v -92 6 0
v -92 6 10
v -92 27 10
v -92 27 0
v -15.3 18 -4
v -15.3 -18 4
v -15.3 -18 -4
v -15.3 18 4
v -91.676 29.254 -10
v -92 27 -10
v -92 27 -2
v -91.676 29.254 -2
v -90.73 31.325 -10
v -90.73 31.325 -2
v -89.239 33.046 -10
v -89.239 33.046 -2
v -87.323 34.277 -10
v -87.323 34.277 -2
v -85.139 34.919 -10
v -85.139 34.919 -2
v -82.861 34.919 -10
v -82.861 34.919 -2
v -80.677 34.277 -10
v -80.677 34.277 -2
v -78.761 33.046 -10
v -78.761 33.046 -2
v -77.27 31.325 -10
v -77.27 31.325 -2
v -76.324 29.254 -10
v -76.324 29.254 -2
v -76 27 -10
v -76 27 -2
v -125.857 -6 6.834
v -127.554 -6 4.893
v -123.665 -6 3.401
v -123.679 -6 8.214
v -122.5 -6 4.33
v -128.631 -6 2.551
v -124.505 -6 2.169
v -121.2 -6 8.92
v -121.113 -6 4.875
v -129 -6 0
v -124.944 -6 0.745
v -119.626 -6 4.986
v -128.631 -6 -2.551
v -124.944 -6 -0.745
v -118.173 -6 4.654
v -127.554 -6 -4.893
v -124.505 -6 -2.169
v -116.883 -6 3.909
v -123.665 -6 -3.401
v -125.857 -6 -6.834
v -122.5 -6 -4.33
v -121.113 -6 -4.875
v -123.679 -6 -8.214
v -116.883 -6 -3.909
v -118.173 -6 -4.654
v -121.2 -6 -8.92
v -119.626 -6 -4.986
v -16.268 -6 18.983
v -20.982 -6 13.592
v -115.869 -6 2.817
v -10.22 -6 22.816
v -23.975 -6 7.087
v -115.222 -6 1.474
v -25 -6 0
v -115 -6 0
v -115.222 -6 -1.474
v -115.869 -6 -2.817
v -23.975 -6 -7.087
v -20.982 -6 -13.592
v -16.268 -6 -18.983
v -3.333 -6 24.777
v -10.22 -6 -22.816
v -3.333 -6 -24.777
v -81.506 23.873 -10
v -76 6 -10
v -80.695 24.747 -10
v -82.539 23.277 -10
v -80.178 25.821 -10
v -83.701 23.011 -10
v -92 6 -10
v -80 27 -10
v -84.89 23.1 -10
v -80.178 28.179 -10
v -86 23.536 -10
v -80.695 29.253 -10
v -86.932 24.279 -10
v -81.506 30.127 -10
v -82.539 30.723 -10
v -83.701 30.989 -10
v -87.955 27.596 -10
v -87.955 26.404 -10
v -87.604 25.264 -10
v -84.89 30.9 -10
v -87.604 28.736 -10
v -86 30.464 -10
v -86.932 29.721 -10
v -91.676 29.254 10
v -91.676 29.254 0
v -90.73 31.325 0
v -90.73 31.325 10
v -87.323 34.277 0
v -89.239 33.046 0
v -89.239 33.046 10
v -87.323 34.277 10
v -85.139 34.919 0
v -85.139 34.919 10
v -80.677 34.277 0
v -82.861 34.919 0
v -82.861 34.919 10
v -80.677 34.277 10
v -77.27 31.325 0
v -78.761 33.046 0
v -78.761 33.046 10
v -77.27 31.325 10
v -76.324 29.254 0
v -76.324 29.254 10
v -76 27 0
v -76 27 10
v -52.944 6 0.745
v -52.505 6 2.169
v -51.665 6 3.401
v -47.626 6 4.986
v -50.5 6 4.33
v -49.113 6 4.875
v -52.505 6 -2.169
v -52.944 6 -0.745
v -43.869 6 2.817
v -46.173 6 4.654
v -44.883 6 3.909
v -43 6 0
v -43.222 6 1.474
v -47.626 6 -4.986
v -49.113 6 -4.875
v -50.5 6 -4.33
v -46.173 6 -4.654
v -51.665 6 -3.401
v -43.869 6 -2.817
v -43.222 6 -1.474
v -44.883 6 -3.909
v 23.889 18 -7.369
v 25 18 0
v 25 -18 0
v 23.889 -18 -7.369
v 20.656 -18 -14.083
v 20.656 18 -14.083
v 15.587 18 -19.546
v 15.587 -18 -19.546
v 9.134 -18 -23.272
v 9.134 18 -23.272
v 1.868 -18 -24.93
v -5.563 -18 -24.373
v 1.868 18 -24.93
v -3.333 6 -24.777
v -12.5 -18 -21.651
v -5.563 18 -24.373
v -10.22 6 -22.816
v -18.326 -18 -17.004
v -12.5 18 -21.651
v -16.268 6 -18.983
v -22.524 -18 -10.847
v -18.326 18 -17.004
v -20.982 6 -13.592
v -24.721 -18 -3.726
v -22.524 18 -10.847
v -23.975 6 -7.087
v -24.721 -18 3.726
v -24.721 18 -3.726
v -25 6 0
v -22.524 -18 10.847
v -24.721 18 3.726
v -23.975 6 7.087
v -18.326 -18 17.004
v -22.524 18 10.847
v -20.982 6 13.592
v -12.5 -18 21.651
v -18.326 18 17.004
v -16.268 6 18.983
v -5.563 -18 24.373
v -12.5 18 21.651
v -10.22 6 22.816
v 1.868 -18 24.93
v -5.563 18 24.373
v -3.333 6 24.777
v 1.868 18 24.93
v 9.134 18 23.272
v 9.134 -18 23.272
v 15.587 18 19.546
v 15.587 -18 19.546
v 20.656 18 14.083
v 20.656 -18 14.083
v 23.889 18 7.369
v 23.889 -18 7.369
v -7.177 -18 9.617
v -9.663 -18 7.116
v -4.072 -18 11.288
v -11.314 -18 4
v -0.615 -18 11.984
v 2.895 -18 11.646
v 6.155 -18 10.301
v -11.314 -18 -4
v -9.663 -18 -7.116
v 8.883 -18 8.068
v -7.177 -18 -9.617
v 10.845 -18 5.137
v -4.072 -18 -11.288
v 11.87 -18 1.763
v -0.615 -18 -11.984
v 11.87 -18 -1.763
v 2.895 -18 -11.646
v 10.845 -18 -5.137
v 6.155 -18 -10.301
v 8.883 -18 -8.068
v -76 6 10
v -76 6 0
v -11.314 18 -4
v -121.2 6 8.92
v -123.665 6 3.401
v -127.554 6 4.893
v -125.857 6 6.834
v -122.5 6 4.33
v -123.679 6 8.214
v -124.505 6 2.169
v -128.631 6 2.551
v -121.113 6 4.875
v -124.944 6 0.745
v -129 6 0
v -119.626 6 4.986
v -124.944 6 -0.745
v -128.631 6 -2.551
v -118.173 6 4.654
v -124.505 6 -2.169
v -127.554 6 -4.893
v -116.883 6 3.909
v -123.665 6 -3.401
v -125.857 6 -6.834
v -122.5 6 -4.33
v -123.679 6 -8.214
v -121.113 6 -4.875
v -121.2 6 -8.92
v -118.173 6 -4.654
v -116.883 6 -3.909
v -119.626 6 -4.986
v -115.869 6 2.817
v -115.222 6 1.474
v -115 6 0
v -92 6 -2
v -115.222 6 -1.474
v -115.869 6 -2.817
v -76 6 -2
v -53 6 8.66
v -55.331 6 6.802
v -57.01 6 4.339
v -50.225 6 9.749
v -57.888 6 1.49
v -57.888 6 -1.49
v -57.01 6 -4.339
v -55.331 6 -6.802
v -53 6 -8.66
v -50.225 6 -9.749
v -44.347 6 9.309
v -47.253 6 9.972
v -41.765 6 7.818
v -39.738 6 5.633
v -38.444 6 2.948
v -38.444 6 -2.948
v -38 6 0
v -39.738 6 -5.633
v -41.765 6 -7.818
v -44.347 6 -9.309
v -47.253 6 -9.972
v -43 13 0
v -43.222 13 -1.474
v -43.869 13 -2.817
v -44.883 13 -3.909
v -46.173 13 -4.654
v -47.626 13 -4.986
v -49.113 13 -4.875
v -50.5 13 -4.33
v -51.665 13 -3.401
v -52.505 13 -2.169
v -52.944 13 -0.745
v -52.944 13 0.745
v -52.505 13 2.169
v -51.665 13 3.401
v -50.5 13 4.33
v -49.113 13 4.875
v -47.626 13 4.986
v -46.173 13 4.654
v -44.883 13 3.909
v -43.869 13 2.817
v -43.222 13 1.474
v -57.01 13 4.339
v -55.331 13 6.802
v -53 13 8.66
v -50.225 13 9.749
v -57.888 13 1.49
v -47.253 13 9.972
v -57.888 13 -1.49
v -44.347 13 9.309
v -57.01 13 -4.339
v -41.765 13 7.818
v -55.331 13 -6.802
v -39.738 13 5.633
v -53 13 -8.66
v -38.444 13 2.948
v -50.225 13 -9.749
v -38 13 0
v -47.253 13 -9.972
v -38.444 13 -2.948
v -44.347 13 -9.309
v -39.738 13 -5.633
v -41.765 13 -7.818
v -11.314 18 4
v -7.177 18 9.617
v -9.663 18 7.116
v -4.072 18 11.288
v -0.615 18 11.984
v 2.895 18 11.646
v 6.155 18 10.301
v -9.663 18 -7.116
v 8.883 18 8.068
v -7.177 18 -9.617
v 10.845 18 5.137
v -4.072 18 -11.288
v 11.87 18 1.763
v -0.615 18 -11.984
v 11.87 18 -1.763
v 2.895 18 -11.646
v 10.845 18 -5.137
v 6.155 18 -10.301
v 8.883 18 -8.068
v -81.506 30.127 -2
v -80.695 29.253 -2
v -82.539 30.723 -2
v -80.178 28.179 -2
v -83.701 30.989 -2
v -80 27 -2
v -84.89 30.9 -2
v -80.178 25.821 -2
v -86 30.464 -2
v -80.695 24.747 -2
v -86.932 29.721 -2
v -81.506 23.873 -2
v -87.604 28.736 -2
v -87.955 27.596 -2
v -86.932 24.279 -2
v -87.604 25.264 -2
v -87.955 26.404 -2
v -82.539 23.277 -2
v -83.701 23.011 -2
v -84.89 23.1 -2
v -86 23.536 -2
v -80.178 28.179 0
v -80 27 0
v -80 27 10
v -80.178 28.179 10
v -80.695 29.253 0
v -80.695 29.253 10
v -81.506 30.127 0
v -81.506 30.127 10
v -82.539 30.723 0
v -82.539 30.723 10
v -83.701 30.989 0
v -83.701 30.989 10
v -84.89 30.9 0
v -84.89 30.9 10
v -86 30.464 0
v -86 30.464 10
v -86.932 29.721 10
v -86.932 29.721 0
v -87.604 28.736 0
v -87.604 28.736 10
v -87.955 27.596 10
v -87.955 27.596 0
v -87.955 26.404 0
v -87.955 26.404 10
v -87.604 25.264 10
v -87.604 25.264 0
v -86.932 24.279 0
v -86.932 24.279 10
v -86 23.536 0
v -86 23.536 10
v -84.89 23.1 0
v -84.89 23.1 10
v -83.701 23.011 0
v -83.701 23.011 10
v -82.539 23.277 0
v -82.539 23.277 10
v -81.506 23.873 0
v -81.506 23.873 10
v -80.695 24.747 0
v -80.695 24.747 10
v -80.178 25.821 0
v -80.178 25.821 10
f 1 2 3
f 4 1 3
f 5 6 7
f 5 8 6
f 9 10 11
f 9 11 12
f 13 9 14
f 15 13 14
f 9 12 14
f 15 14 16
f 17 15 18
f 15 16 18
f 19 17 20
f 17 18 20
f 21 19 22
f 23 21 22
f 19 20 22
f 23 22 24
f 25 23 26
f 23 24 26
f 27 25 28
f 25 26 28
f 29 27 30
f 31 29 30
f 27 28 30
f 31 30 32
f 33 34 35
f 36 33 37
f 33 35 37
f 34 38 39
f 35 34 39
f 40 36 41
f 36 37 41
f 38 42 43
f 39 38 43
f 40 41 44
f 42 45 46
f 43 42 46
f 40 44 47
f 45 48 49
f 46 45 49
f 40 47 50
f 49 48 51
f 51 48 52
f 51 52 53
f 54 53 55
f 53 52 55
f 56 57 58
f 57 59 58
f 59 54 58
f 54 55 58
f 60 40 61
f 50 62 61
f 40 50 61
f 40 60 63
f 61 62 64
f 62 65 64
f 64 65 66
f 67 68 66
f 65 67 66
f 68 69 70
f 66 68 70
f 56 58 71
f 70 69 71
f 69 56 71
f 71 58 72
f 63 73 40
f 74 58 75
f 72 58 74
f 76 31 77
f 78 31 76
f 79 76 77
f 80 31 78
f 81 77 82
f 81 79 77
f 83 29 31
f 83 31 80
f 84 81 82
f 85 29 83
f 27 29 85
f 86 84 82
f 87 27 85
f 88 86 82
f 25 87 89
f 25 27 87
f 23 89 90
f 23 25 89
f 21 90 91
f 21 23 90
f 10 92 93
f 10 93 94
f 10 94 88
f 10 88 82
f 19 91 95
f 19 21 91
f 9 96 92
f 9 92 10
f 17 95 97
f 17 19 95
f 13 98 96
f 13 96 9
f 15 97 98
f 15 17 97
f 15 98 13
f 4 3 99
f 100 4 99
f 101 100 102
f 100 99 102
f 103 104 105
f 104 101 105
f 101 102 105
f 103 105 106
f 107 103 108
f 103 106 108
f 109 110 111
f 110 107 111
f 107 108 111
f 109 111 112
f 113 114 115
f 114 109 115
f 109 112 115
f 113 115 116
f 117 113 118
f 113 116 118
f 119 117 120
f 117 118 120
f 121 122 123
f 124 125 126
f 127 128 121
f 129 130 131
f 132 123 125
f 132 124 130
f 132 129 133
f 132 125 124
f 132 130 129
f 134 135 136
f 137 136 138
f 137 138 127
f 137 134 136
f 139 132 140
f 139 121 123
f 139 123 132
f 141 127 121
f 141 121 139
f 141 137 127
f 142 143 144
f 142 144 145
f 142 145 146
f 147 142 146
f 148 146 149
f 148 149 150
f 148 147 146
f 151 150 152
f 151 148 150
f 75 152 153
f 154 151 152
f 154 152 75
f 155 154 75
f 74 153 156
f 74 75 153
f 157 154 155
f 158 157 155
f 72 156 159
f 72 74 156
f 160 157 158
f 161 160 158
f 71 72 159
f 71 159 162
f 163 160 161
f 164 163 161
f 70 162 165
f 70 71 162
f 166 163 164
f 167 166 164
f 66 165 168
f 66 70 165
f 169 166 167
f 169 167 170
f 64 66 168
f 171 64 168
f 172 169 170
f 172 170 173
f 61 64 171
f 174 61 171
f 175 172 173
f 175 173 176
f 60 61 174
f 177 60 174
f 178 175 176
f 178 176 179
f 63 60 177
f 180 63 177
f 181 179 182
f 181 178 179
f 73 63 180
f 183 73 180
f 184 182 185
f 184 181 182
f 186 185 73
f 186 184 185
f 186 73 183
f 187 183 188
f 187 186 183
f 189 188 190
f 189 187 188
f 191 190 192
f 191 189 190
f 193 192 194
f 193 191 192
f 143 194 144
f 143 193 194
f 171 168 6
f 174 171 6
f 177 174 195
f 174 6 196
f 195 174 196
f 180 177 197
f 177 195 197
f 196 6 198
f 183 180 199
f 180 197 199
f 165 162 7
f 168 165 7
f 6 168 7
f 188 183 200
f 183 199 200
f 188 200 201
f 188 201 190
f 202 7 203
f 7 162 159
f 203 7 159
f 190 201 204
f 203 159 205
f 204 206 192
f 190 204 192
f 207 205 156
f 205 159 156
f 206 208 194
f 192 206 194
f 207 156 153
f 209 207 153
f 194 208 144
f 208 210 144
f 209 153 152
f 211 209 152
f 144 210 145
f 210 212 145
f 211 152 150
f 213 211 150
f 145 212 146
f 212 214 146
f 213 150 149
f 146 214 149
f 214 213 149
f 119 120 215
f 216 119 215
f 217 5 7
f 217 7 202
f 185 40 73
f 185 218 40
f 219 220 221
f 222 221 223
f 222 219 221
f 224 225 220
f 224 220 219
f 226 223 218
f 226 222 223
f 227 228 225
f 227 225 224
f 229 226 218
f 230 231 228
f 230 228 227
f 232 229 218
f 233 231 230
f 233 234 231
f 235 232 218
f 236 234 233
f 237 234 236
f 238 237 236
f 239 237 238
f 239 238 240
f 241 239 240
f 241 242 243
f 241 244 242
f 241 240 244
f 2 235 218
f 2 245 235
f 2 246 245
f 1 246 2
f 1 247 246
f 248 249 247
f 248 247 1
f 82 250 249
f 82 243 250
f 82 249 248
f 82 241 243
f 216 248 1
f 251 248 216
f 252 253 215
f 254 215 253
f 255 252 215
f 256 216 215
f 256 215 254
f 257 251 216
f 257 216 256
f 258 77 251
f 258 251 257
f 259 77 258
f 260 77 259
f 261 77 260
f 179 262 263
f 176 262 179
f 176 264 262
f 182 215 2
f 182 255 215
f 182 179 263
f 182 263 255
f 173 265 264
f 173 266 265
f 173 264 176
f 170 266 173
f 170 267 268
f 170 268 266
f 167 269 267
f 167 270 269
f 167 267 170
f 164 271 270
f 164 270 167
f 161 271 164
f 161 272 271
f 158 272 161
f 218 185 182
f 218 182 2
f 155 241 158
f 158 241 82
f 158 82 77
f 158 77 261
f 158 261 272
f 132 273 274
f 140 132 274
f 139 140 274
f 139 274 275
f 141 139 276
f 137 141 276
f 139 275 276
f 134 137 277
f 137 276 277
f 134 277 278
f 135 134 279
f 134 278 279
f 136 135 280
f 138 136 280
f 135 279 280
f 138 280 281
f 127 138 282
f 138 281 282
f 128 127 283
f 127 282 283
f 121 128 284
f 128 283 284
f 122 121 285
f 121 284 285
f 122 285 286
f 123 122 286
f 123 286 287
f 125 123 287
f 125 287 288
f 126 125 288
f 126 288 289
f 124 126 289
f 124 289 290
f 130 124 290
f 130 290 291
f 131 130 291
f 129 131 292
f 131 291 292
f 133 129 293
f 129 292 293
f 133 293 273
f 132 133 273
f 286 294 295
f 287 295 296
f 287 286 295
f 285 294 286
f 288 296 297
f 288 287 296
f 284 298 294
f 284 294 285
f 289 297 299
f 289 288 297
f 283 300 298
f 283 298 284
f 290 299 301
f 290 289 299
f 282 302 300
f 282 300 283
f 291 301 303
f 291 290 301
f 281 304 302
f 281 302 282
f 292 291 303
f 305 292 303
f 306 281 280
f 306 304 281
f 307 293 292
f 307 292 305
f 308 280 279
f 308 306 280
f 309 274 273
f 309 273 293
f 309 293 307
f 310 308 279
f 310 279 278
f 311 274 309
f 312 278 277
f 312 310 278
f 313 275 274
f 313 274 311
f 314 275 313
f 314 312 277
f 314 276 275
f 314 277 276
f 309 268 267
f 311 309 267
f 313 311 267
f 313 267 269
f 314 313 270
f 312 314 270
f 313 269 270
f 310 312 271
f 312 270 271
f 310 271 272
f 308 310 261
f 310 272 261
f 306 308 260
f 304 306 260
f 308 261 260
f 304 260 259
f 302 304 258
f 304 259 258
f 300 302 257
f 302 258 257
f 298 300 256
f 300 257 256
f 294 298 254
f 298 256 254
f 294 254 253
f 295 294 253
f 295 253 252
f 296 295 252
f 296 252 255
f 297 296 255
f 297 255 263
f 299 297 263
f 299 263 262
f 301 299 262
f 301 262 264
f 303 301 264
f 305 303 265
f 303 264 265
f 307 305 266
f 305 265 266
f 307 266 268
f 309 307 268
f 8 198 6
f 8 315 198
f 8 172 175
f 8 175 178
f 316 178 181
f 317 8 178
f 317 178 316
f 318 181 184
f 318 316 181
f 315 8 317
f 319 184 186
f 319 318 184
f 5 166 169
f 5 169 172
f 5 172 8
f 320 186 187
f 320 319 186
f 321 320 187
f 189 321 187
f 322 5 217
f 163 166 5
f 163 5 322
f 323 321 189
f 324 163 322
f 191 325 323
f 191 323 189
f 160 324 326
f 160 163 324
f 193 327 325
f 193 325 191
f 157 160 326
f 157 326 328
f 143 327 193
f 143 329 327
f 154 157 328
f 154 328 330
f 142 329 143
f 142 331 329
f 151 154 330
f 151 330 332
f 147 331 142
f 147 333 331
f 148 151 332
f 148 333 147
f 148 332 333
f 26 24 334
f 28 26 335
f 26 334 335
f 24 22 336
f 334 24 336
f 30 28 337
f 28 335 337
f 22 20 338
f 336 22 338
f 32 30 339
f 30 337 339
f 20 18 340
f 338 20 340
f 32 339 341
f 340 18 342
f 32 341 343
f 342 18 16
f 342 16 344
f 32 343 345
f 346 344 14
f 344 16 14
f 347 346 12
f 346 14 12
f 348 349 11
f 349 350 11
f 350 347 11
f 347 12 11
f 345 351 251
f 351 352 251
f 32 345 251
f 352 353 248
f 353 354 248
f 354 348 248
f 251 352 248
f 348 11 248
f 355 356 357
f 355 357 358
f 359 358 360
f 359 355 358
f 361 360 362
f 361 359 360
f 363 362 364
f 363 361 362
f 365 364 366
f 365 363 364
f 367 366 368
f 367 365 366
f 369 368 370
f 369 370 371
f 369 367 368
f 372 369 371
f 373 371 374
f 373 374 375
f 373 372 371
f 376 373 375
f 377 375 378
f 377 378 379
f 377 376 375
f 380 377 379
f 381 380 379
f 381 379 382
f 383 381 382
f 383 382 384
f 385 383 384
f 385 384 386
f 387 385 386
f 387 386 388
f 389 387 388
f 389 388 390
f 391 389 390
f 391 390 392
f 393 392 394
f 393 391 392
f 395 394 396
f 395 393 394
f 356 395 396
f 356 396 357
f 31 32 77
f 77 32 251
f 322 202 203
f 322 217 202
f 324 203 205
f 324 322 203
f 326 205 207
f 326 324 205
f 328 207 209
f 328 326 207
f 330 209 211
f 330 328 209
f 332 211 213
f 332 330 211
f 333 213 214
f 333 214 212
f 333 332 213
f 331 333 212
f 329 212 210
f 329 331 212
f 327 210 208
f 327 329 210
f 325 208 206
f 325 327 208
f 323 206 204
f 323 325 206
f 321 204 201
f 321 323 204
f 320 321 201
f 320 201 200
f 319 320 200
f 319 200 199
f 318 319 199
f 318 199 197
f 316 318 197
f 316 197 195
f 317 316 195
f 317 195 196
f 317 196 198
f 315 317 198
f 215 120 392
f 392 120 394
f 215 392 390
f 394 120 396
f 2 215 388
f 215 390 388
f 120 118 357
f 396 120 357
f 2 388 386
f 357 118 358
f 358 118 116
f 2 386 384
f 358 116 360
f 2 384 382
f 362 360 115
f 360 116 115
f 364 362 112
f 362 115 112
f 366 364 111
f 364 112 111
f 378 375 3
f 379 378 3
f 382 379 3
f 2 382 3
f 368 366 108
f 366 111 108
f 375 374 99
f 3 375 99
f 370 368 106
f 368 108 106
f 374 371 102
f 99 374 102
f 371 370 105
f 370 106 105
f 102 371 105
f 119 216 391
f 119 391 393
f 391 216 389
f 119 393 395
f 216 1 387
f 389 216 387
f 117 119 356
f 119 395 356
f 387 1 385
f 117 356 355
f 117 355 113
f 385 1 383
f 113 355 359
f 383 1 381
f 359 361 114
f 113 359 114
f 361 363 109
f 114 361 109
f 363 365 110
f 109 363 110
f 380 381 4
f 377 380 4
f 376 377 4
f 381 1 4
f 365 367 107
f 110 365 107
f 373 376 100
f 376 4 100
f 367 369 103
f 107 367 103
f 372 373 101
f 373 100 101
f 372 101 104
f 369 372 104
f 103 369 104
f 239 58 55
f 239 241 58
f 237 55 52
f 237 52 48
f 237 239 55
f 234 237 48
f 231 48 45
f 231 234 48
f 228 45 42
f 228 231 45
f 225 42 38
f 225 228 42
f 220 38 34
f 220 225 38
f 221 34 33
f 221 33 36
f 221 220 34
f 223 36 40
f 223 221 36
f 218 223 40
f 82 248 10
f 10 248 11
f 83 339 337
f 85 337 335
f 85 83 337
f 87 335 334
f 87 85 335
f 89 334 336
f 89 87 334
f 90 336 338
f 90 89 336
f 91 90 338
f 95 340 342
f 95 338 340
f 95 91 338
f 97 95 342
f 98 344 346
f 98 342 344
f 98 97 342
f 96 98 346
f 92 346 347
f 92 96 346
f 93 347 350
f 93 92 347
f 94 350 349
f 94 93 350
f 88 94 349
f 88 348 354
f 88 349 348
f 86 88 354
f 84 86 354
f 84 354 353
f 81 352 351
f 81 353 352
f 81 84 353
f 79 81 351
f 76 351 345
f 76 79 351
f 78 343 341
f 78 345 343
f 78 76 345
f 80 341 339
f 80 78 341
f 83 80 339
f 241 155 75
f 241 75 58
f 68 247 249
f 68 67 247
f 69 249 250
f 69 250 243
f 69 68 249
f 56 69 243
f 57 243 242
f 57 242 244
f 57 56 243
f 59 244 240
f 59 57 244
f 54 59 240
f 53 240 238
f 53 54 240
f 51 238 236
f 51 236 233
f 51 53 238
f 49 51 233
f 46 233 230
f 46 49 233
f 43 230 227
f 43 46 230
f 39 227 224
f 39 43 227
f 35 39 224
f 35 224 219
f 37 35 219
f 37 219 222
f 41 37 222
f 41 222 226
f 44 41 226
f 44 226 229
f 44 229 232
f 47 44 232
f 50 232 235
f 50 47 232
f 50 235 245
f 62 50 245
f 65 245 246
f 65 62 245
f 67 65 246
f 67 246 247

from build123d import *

# Parameters (mm, degrees)
IZIM1_R                     = 25
Y_KSEKLIK_EKSTR_ZYON1_DEPTH = 18
IZIM2_R                     = 5
Y_KSEKLIK_EKSTR_ZYON2_DEPTH = 6
IZIM3_R                     = 10
Y_KSEKLIK_EKSTR_ZYON3_DEPTH = 7
IZIM4_R                     = 5
KES_EKSTR_ZYON1_DEPTH       = 7
IZIM9_R                     = 4
Y_KSEKLIK_EKSTR_ZYON5_DEPTH = 10
KES_EKSTR_ZYON2_DEPTH       = 16


with BuildPart() as part:
    # Çizim1 → Yükseklik-Ekstrüzyon1 (new body, symmetric)
    with BuildSketch(Plane(origin=(0, 0, 0), x_dir=(1, 0, 0), z_dir=(0, 1, 0))):
        Circle(IZIM1_R)
        with BuildLine():
            Line((-15.3, 4), (-11.313708499, 4))
            ThreePointArc((-11.313708499, 4), (12, 0), (-11.313708499, -4))
            Line((-11.313708499, -4), (-15.3, -4))
            Line((-15.3, -4), (-15.3, 4))
        make_face(mode=Mode.SUBTRACT)
    extrude(amount=Y_KSEKLIK_EKSTR_ZYON1_DEPTH, both=True)

    # Çizim2 → Yükseklik-Ekstrüzyon2 (add, symmetric)
    with BuildSketch(Plane(origin=(0, 0, 0), x_dir=(1, 0, 0), z_dir=(0, 1, 0))):
        with BuildLine():
            Line((-121.2, -8.919641248), (-3.333333333, -24.776781246))
            ThreePointArc((-3.333333333, -24.776781246), (-25, 0), (-3.333333333, 24.776781246))
            Line((-3.333333333, 24.776781246), (-121.2, 8.919641248))
            ThreePointArc((-121.2, 8.919641248), (-129, 0), (-121.2, -8.919641248))
        make_face()
        with Locations((-120, 0)):
            Circle(IZIM2_R, mode=Mode.SUBTRACT)
    extrude(amount=Y_KSEKLIK_EKSTR_ZYON2_DEPTH, both=True)

    # Çizim3 → Yükseklik-Ekstrüzyon3 (add)
    with BuildSketch(Plane(origin=(0, 6, 0), x_dir=(1, 0, 0), z_dir=(0, 1, 0))):
        with Locations((-48, 0)):
            Circle(IZIM3_R)
    extrude(amount=Y_KSEKLIK_EKSTR_ZYON3_DEPTH)

    # Çizim4 → Kes-Ekstrüzyon1 (cut)
    with BuildSketch(Plane(origin=(0, 13, 0), x_dir=(1, 0, 0), z_dir=(0, 1, 0))):
        with Locations((-48, 0)):
            Circle(IZIM4_R)
    extrude(amount=-KES_EKSTR_ZYON1_DEPTH, mode=Mode.SUBTRACT)

    # Çizim9 → Yükseklik-Ekstrüzyon5 (add, symmetric)
    with BuildSketch(Plane.XY):
        with BuildLine():
            Line((-76, 27), (-76, 6))
            Line((-76, 6), (-92, 6))
            Line((-92, 6), (-92, 27))
            ThreePointArc((-92, 27), (-84, 35), (-76, 27))
        make_face()
        with Locations((-84, 27)):
            Circle(IZIM9_R, mode=Mode.SUBTRACT)
    extrude(amount=Y_KSEKLIK_EKSTR_ZYON5_DEPTH, both=True)

    # Çizim10 → Kes-Ekstrüzyon2 (cut)
    with BuildSketch(Plane.ZY.offset(92)):
        Polygon((0, 6), (-2, 6), (-2, 27), (-2, 35), (0, 35), (0, 27), align=None)
    extrude(amount=-KES_EKSTR_ZYON2_DEPTH, mode=Mode.SUBTRACT)


solid = part.part
